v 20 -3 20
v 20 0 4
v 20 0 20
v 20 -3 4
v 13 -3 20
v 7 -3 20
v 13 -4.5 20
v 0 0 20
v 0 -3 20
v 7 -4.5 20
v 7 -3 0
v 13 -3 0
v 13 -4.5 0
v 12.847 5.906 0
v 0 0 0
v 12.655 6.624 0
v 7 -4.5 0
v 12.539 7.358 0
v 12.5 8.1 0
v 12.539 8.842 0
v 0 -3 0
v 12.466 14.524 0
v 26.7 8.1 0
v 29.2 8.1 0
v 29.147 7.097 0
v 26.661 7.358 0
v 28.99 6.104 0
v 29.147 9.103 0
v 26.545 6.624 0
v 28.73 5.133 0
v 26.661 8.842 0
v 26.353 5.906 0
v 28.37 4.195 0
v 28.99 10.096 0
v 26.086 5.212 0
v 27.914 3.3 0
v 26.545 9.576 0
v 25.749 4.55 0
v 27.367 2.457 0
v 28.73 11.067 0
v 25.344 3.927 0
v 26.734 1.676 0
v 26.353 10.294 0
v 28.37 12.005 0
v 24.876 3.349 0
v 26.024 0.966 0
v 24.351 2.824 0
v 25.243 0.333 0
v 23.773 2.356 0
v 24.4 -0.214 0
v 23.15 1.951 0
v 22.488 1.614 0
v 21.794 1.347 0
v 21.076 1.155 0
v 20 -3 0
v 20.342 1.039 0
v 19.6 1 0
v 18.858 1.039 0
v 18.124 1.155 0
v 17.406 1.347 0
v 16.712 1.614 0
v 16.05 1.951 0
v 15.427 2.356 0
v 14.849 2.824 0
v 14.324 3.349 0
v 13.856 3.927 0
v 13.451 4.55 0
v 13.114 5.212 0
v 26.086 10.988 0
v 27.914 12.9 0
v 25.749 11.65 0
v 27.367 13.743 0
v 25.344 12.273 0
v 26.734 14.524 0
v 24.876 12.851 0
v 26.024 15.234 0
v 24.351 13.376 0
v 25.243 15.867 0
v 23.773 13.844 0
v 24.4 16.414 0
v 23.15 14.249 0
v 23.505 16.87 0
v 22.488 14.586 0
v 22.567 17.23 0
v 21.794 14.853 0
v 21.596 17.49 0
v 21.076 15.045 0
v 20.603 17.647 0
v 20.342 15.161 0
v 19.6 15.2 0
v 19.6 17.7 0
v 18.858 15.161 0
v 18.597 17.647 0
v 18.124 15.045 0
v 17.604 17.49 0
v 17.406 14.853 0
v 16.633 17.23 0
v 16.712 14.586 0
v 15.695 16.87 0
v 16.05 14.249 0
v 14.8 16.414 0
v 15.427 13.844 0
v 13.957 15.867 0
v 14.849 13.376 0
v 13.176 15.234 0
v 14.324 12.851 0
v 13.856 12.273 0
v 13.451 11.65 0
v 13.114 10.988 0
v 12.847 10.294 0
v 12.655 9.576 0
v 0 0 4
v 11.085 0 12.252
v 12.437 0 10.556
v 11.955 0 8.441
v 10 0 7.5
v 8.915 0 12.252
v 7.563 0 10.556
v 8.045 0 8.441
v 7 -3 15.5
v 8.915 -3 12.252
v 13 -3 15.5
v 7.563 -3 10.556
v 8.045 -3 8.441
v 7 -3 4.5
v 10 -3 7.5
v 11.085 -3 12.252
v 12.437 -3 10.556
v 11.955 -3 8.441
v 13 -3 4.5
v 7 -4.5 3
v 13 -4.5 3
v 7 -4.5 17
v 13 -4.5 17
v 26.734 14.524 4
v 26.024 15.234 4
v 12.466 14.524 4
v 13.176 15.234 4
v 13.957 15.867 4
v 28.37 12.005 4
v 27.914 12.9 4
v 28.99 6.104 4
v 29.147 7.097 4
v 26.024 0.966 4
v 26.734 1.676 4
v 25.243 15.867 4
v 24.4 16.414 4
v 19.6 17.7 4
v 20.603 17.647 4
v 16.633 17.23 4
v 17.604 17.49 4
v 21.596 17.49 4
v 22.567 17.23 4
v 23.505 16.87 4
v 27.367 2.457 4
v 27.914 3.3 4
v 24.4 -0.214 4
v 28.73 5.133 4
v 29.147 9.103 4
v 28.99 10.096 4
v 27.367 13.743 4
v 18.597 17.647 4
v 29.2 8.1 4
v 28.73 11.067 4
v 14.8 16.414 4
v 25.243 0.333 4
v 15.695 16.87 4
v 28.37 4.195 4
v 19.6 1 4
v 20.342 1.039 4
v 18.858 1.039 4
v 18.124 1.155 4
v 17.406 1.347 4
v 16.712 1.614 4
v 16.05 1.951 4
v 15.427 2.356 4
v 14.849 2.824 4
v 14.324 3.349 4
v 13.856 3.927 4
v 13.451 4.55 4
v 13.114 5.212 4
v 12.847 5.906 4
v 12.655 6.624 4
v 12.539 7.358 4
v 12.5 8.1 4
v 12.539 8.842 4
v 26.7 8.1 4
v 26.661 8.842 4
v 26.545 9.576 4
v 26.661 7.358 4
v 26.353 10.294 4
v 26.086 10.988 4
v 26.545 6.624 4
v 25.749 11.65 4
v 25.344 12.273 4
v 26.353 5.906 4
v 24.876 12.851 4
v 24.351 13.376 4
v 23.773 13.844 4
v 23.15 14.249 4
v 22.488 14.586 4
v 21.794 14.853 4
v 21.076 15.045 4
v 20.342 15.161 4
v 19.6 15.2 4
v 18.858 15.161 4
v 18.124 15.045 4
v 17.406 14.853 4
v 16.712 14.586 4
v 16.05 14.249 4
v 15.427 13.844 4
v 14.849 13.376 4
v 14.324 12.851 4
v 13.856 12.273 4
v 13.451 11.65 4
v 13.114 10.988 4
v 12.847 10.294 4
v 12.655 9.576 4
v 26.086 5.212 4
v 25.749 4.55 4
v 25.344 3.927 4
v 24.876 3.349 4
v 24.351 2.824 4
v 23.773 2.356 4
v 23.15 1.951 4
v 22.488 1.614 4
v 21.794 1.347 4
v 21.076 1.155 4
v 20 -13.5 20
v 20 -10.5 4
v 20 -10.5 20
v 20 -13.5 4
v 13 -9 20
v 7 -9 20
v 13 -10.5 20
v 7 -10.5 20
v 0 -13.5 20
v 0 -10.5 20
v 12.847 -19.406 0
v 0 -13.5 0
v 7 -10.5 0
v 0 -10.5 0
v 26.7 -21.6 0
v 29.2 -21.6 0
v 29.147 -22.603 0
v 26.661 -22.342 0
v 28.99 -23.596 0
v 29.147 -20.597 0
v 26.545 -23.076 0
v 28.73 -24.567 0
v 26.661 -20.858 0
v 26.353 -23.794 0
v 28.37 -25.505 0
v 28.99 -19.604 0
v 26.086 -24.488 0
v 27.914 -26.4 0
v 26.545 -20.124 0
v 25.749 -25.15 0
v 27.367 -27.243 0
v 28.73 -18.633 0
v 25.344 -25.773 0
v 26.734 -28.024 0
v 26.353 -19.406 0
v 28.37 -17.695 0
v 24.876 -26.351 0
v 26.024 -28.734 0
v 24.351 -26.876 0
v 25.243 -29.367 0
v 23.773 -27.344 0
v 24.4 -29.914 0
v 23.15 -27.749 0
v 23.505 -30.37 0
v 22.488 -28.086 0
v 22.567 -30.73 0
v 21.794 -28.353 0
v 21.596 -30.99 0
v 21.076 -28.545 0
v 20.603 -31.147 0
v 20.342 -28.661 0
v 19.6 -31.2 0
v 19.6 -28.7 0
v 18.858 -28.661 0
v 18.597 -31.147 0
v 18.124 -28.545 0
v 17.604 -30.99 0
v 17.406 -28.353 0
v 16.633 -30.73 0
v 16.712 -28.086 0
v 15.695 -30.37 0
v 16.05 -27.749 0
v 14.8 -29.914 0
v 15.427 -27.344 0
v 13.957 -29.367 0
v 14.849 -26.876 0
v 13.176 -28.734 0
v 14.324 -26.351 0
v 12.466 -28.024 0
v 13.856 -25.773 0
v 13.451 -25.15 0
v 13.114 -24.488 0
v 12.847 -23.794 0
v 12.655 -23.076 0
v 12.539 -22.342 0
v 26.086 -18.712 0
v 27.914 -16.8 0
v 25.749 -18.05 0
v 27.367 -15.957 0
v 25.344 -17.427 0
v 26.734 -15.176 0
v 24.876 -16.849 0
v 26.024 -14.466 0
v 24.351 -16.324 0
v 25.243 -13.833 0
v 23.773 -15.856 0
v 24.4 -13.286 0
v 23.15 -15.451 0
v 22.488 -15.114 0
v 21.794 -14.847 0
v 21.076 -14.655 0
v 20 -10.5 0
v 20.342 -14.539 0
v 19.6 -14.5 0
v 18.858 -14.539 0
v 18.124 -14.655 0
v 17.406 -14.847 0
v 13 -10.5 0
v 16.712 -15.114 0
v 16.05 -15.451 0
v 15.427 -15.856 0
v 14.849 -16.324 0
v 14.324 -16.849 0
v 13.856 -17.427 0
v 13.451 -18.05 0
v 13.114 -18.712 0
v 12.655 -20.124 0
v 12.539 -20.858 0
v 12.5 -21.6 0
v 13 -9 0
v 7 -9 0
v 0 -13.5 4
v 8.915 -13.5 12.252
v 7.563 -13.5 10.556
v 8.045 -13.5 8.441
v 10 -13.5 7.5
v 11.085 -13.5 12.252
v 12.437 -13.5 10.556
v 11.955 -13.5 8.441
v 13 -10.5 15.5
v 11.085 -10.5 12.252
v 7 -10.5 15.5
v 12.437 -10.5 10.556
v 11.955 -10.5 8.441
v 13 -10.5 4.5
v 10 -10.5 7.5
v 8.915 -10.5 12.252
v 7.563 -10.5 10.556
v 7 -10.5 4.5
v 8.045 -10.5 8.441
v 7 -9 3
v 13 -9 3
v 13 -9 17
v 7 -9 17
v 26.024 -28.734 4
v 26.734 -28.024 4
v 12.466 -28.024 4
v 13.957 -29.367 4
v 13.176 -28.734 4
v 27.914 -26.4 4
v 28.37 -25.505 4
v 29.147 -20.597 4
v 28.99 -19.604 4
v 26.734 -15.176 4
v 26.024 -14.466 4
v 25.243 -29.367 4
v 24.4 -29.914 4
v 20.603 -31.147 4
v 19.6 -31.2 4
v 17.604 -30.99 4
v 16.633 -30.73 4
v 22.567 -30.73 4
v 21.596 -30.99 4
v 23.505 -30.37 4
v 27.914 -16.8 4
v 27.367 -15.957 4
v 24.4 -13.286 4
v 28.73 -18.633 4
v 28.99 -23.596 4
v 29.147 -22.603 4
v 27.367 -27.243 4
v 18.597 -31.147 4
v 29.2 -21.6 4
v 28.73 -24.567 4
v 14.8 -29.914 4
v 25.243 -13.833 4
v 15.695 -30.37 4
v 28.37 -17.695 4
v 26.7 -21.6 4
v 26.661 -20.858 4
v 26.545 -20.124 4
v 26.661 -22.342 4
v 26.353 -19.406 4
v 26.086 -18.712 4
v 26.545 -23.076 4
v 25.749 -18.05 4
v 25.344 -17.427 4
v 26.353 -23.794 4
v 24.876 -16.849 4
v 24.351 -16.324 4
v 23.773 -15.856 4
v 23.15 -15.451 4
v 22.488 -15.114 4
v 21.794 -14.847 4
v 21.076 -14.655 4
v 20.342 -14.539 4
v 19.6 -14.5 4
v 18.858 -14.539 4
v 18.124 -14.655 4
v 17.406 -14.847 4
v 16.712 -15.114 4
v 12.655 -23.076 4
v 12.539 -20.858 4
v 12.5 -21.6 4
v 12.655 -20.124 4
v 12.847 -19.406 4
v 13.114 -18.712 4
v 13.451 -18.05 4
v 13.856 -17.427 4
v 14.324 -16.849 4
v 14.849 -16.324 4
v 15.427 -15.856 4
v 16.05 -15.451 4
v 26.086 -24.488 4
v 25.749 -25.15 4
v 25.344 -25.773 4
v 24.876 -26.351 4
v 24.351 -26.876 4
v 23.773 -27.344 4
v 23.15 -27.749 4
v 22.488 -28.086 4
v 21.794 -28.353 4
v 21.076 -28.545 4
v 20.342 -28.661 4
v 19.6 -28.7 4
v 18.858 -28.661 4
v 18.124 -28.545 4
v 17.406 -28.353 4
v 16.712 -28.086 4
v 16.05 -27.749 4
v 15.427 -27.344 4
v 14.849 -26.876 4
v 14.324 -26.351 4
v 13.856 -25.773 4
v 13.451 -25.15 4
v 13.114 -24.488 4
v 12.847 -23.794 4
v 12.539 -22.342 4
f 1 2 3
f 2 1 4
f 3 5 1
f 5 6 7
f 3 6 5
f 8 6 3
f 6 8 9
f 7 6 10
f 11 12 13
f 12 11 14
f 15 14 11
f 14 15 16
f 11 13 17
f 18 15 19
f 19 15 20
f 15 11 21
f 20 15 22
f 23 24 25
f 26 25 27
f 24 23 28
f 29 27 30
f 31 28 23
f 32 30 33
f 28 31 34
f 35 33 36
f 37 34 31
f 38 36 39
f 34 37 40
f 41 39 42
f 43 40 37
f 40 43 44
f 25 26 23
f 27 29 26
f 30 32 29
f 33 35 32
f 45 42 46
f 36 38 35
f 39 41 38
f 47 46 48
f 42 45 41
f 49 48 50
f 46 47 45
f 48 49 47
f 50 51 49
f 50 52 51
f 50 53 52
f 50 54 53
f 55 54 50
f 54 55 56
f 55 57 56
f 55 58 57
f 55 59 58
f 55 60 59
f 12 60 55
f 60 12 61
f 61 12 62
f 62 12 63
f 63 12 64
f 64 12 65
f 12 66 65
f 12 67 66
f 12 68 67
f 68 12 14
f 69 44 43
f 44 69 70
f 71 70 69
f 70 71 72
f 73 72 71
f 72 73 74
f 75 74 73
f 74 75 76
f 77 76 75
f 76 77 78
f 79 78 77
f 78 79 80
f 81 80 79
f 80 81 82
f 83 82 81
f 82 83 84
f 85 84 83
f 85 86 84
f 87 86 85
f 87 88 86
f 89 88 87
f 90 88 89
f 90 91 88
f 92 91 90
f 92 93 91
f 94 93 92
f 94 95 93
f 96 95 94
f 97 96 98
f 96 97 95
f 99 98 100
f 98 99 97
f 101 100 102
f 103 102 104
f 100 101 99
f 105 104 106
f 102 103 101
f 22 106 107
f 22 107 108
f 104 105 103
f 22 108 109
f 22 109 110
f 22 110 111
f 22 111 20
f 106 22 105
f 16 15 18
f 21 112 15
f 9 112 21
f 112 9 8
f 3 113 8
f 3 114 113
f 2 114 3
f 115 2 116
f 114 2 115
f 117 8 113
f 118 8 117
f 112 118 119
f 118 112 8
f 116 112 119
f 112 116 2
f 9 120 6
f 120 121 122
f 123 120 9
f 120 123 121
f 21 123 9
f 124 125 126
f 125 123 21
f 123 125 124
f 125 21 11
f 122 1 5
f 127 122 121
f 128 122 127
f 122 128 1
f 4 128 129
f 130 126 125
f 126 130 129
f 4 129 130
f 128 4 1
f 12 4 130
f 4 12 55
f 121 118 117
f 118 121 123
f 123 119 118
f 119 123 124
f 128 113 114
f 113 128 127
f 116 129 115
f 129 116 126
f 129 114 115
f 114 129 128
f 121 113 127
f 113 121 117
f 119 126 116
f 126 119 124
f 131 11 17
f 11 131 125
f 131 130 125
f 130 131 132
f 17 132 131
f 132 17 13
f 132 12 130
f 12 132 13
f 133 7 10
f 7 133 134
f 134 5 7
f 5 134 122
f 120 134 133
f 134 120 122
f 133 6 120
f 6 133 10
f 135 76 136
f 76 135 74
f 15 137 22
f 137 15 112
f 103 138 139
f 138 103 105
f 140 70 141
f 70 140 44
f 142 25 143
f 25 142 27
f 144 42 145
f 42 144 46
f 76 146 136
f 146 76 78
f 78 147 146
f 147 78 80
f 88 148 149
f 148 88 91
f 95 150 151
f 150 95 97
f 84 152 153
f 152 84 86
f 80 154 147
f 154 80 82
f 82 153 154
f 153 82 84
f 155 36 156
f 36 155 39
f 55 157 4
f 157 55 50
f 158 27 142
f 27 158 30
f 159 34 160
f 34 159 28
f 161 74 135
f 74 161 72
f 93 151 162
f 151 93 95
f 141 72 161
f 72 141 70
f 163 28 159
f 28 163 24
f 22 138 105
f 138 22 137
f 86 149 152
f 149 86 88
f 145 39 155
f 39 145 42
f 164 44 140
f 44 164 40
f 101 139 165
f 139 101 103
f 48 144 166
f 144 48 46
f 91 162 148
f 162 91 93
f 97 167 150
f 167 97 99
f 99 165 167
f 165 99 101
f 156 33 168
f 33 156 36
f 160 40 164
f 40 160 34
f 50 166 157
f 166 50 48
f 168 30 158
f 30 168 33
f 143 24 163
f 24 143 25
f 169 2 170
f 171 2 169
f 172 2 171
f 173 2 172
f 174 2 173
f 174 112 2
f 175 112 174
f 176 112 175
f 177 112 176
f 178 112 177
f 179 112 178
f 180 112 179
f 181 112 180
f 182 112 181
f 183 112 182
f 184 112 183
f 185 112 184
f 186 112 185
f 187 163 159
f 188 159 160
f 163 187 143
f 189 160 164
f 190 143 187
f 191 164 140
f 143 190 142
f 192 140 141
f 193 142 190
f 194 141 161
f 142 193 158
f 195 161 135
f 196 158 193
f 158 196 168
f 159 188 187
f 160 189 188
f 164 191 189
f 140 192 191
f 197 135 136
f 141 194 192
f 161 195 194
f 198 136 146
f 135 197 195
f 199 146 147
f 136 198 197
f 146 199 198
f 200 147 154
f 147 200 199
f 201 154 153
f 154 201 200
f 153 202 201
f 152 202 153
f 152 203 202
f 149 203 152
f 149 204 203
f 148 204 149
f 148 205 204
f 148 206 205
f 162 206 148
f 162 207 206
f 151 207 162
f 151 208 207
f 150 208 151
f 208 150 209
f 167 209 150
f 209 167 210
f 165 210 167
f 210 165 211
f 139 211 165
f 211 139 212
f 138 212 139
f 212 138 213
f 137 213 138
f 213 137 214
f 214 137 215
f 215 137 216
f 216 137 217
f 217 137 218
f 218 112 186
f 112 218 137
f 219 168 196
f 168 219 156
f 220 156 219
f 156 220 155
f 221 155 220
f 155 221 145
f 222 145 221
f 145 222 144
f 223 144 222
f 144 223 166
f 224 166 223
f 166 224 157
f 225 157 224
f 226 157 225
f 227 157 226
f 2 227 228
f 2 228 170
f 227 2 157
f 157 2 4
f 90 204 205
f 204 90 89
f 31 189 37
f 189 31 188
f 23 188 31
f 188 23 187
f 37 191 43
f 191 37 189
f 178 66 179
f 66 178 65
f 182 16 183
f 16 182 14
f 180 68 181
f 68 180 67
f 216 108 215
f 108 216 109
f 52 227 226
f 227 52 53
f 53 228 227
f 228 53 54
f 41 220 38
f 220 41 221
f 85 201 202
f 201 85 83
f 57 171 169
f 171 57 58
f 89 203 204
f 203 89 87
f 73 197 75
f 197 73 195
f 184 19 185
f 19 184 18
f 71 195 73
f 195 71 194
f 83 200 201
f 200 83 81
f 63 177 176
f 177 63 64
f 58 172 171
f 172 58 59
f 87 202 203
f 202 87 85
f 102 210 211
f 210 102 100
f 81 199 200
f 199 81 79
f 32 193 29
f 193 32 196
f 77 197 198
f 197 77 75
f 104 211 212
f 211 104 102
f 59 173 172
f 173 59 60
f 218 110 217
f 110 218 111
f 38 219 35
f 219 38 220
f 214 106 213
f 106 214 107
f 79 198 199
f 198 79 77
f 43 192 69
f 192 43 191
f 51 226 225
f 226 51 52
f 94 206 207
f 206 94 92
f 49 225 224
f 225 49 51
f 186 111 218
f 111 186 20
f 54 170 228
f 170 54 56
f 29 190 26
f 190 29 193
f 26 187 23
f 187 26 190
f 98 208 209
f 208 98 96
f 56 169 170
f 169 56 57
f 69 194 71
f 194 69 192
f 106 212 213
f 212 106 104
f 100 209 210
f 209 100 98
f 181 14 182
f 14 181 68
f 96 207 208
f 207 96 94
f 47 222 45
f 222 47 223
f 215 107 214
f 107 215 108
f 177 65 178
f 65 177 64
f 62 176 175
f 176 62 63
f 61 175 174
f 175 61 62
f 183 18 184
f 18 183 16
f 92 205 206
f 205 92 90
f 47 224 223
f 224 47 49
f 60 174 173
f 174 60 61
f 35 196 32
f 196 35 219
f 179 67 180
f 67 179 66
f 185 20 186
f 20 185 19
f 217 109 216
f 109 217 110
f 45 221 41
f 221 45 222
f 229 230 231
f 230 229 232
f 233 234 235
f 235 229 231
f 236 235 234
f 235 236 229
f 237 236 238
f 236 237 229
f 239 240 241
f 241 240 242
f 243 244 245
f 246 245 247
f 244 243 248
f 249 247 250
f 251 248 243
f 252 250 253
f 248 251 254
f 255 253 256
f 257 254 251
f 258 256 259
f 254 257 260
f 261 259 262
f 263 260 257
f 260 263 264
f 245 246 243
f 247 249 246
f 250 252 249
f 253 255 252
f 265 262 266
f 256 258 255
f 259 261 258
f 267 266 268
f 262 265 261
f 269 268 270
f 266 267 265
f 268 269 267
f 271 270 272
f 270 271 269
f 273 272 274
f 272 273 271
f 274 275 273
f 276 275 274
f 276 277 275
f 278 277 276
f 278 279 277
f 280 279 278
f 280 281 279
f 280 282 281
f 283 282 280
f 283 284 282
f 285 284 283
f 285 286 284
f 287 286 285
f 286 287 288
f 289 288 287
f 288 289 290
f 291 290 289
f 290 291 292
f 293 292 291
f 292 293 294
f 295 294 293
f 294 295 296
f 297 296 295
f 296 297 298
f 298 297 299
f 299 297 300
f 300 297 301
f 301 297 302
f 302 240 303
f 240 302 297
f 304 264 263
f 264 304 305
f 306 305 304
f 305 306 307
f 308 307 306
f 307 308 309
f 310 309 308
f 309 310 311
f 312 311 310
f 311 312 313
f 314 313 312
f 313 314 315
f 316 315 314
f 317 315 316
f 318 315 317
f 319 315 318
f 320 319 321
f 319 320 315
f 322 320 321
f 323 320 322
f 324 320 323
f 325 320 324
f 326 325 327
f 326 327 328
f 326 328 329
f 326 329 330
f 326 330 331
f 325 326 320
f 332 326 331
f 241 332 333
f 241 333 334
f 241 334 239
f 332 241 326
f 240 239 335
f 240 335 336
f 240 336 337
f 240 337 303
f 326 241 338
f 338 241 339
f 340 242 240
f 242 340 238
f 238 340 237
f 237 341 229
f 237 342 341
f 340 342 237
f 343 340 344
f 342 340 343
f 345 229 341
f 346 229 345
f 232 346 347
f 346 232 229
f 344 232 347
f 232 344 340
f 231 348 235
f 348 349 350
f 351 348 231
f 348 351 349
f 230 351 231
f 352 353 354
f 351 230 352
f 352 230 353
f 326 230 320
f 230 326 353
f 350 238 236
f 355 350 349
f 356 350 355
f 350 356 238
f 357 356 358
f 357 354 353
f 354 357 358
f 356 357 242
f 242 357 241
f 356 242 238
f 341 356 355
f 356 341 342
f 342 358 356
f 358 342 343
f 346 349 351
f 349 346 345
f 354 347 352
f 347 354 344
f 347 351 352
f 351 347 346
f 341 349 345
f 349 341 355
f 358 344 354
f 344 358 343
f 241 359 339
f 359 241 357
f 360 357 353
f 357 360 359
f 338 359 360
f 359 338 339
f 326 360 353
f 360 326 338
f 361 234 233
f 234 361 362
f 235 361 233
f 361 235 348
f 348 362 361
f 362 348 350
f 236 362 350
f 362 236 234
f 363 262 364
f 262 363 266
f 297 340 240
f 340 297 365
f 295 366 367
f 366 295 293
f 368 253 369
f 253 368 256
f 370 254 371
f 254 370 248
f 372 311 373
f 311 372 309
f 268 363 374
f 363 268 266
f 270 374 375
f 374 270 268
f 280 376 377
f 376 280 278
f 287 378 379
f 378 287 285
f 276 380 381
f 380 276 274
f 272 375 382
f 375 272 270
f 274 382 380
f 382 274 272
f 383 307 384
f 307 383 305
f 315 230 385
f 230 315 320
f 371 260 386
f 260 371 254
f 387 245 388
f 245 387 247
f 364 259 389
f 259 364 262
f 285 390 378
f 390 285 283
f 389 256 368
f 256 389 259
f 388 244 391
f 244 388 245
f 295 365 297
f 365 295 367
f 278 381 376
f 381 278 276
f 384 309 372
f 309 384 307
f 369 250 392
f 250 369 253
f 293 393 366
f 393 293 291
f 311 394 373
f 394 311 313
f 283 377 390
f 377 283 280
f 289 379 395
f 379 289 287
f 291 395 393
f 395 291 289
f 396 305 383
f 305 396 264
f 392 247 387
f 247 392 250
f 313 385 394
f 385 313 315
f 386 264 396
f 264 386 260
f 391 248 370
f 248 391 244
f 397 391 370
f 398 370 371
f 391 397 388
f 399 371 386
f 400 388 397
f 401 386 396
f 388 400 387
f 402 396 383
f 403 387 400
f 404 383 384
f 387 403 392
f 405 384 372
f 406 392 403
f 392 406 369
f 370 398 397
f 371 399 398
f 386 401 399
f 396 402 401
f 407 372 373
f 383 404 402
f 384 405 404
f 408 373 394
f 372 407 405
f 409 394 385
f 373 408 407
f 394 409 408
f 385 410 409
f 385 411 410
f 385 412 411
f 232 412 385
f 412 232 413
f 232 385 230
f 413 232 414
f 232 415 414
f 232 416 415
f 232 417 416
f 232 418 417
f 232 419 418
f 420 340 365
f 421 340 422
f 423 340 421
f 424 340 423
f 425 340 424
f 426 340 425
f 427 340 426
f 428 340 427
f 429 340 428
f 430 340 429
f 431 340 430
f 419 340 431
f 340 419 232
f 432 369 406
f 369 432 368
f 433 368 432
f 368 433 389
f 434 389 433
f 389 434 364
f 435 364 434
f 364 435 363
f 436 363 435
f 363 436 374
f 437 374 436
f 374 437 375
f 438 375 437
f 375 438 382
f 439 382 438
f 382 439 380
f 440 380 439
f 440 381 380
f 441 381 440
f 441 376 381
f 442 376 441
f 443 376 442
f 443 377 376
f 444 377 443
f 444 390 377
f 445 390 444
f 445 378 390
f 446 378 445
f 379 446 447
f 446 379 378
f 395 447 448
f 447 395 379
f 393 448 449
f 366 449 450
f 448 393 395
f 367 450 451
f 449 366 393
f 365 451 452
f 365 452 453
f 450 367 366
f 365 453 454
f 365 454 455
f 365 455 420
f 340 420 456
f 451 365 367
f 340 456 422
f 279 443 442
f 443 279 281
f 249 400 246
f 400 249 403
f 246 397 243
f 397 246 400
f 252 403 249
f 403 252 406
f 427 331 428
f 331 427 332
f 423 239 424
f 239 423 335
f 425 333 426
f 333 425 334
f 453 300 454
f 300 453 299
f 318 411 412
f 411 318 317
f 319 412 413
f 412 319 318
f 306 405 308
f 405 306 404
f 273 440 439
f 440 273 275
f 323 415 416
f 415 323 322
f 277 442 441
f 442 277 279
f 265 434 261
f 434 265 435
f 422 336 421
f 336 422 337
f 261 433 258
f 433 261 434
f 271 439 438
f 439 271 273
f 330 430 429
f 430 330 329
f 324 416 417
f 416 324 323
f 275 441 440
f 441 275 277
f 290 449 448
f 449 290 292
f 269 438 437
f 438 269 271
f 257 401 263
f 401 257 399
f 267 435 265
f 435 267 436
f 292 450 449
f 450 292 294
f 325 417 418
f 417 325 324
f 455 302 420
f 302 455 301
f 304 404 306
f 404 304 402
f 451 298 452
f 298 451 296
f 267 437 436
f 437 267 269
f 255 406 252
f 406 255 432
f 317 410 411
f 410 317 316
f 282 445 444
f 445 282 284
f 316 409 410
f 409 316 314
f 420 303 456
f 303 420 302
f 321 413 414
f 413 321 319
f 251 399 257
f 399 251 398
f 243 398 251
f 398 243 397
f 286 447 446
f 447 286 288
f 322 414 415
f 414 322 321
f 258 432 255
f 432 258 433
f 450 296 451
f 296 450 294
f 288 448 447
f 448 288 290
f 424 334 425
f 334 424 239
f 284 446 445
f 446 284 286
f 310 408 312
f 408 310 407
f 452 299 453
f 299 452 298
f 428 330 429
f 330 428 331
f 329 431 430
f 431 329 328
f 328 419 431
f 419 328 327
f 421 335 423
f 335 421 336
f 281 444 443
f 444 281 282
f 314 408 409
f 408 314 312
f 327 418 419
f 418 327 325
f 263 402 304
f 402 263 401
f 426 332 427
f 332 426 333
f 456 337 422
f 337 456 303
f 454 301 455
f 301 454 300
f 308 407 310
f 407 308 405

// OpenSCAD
// length of base plate (mm)
length = 20;

// thickness of base plate (mm)
thick = 3;

// width of carrier profile (mm)
width = 20;

// diameter of mounting screw (mm)
screw_dia = 5;


// diameter of LED carrier hole (mm) - e.g. a square profile of 10x10mm has 14.2mm diameter = ( 10 * sqrt(2) )
dia = 14.2;

// width of rim around hole (mm)
rim = 2.5;

// length of slot anchor (mm)
lsa = 3;

// protrusion of profile slot anchor into profile (mm)
deep = 1.5;

// width of profile slot anchor (mm)
slit = 6;

module slot() {
    points = [[0,0],[0,lsa+deep],[deep,lsa],[deep,0]];

rotate( [90,0,-90] )
linear_extrude( slit)
polygon( points, convexity = 1 );
}


module clip() {

translate([0,-1 * thick ,0] ) {

translate([( width + slit )/2,0,0])
slot();
    translate([width/2 -slit/2, 0, length] )
    rotate([0,180,0])
    slot();

difference() {
cube( [width, thick, length ] );
    translate( [width/2, thick + 1,length/ 2 ])
    rotate( [90,90,0] )
    cylinder( thick + 2,screw_dia/2, screw_dia/2, $fn = 7 );
    }
}

difference() {
hull() {
    translate([ width/2 + (dia/2) + rim , (dia/2) +1 , 0] ) 
    cylinder(4, (dia/2)+rim, (dia/2)+rim, $fn = 60);
    translate([0,-1 * thick,0])
    cube([ width, thick , 4]);
}

    translate([ width/2 + (dia/2) + rim , (dia/2) +1 , -1] ) 
    cylinder(6, (dia/2), (dia/2), $fn = 60);
}

}

clip();

mirror([0,1,0])
translate([0, 3 * ( thick + deep ),0])
clip();
